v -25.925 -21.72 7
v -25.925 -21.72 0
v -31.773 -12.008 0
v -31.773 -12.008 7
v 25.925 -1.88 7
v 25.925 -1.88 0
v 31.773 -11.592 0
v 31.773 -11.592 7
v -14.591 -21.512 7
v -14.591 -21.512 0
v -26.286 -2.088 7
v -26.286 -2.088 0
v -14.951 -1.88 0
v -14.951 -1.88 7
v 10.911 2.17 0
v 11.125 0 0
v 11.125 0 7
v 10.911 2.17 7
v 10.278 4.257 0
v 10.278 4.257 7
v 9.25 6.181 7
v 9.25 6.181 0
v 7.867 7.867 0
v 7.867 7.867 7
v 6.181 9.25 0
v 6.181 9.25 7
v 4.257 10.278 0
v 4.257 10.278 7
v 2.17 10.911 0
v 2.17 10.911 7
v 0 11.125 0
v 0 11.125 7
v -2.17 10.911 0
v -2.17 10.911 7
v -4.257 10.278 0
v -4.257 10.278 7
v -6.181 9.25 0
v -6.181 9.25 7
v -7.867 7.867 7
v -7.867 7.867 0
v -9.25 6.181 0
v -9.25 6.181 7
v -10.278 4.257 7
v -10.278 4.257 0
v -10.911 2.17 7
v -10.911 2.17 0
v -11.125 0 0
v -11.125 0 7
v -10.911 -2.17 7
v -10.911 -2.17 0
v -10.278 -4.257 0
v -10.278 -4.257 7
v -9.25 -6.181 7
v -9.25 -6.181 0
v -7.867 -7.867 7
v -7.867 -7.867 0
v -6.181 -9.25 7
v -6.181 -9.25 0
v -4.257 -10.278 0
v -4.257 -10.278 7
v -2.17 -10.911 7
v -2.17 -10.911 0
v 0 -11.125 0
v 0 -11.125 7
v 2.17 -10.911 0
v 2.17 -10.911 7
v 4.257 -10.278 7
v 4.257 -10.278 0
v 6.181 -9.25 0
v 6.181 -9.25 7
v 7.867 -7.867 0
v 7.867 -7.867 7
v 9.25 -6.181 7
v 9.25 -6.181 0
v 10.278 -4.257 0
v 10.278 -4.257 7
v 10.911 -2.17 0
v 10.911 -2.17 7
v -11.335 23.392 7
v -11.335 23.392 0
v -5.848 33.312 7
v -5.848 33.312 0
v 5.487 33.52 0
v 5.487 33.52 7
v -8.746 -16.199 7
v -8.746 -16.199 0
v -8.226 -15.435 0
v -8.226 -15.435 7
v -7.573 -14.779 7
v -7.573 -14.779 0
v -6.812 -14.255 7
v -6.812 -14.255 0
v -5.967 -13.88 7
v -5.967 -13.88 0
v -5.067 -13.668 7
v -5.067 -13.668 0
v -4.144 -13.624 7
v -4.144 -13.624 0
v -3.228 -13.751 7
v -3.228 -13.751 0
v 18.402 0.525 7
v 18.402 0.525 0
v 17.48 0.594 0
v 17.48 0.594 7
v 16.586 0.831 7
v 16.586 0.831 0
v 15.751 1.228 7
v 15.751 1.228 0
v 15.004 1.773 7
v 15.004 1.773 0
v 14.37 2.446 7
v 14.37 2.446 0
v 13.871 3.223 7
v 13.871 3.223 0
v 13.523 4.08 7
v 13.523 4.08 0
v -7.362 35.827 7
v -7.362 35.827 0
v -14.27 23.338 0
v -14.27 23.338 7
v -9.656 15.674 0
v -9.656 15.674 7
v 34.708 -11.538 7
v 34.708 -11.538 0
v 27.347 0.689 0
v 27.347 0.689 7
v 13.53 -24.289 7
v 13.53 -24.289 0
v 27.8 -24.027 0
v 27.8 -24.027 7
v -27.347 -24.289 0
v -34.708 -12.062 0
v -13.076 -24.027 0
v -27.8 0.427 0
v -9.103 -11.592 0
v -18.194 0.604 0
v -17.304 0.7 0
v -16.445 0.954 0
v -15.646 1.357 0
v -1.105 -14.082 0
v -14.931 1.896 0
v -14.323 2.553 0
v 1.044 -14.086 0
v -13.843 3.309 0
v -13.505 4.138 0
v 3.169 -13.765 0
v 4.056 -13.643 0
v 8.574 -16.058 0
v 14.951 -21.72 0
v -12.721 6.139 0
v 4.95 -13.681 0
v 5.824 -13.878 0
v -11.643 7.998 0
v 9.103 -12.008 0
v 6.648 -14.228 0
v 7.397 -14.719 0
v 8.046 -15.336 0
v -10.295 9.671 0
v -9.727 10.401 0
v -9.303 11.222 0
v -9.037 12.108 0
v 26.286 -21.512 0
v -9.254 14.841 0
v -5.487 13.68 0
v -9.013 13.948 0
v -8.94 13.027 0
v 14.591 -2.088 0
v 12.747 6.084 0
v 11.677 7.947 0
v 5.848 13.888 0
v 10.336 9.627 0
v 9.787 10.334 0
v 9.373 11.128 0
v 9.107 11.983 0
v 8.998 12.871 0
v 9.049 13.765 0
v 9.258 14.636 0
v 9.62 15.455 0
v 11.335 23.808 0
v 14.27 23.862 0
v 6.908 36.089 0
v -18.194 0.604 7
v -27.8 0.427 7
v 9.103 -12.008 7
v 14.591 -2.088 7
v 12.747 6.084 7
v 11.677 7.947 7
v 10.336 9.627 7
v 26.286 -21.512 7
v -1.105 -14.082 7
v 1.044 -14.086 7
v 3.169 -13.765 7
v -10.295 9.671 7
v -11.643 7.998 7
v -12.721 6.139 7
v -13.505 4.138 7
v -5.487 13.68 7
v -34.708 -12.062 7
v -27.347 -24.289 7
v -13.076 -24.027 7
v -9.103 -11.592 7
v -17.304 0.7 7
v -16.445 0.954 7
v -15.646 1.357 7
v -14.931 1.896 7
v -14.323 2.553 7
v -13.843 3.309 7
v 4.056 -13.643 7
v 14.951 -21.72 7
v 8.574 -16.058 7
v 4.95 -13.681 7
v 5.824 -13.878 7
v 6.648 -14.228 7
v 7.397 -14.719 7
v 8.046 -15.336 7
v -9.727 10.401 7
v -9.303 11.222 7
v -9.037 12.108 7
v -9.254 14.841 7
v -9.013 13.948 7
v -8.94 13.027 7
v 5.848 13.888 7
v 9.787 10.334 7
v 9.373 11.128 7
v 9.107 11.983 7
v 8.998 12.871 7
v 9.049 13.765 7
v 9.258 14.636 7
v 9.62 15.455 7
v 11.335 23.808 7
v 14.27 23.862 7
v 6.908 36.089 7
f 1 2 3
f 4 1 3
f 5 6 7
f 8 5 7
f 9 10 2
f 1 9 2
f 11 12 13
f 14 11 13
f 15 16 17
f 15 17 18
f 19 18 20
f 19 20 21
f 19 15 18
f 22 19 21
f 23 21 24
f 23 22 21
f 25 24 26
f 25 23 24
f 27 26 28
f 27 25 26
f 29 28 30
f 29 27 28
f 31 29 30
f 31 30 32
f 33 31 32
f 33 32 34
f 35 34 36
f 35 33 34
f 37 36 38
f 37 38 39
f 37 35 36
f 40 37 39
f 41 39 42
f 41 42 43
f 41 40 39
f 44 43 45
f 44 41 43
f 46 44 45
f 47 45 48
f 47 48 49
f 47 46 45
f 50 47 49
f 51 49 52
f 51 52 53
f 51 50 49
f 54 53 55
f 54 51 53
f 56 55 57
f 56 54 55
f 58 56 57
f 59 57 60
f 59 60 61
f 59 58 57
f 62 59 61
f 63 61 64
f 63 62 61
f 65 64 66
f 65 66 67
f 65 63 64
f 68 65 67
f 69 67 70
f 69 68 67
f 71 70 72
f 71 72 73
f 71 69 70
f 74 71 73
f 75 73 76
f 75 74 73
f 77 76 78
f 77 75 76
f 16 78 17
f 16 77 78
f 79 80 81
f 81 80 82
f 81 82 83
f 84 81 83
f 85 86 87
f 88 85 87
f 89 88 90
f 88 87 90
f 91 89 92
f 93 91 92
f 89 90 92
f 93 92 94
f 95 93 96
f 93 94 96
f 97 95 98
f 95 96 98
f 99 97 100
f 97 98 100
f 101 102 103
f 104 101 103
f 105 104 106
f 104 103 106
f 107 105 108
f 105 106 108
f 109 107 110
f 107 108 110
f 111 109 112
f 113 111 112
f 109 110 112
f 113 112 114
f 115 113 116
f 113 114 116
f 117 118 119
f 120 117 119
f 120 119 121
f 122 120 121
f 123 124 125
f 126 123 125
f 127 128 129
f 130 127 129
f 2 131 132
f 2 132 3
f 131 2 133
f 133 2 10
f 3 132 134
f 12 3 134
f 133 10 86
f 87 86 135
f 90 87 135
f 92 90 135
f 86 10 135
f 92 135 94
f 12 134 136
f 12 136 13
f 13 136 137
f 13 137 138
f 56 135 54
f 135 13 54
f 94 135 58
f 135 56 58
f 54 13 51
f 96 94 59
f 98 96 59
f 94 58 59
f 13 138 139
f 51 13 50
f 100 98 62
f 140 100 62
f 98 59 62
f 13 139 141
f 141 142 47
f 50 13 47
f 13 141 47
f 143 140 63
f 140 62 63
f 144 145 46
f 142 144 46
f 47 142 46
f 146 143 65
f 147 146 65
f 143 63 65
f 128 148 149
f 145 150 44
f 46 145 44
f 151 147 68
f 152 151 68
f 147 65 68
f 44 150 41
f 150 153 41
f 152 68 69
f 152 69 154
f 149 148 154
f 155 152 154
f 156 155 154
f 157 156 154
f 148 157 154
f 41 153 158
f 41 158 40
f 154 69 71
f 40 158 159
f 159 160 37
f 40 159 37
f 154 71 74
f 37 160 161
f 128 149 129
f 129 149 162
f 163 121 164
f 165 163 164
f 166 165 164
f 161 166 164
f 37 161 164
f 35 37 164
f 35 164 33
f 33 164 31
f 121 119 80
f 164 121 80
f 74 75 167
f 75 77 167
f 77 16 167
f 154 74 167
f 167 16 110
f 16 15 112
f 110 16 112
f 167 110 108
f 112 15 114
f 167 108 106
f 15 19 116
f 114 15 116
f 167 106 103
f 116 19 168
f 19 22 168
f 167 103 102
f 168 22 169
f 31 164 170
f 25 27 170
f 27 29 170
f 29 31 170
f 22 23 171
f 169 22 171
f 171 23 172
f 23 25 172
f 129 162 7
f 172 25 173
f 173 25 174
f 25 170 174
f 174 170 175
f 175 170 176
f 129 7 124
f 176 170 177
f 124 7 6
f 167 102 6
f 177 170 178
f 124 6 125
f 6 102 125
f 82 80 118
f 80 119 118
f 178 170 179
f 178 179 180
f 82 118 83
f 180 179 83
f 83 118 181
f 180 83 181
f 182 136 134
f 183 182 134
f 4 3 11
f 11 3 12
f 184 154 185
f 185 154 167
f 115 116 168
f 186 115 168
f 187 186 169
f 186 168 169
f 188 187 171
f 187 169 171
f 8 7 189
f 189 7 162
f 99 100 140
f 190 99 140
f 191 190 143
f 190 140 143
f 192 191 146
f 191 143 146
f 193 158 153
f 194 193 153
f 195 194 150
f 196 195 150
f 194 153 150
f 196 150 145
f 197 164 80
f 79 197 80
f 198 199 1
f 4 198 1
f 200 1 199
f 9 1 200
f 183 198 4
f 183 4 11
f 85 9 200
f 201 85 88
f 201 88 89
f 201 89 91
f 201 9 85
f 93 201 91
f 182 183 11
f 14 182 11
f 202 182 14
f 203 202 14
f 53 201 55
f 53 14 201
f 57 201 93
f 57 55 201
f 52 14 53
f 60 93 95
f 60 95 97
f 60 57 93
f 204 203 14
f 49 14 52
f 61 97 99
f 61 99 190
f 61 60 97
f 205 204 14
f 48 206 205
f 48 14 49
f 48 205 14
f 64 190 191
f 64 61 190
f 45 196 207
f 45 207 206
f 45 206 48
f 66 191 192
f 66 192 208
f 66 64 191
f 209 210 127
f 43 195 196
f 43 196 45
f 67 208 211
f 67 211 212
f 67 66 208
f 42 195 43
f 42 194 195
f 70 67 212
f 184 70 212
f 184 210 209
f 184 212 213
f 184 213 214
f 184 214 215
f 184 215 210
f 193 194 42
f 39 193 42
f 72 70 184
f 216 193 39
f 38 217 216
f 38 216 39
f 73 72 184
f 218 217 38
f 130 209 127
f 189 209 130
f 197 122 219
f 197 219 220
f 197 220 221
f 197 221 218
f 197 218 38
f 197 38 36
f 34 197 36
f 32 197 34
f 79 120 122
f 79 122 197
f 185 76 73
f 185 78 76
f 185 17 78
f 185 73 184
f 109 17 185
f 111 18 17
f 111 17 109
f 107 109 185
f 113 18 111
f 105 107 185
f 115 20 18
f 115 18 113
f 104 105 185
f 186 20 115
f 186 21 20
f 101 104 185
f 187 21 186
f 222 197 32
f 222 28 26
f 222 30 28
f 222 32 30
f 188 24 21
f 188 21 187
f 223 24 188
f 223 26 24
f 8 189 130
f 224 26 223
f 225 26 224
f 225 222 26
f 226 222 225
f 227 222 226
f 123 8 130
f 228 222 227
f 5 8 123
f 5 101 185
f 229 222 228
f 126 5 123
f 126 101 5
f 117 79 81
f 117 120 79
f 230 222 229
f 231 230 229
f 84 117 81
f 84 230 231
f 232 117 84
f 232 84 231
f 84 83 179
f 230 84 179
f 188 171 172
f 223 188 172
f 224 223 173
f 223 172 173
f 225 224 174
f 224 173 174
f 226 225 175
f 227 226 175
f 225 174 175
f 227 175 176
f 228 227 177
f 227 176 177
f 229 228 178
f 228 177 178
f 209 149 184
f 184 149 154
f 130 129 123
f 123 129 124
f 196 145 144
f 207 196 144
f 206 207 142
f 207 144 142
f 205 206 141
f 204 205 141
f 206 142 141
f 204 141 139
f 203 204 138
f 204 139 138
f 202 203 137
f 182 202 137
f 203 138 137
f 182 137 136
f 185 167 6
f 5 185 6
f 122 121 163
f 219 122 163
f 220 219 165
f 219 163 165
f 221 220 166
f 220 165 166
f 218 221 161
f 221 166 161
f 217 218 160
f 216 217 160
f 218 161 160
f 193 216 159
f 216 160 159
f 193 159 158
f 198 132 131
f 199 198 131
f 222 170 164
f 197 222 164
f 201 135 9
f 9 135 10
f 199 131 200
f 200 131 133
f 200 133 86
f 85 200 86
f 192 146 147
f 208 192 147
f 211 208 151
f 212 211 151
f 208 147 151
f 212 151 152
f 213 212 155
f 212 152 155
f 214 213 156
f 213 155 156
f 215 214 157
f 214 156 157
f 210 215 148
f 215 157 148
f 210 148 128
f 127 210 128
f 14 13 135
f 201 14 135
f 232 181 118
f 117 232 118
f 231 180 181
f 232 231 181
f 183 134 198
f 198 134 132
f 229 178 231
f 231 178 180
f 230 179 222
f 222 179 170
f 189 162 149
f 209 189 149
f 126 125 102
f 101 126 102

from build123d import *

# Parameters (mm, degrees)
F0_R     = 11.125
F1_DEPTH = 7


with BuildPart() as f1:
    # F0 (on Top) → F1 (new body)
    with BuildSketch(Plane.XY):
        with BuildLine():
            Line((-14.270237, 23.338111), (-9.655566, 15.673587))
            ThreePointArc((-9.655566, 15.673587), (-8.967214, 12.565001), (-10.294885, 9.671141))
            ThreePointArc((-10.294885, 9.671141), (-12.217419, 7.088744), (-13.505254, 4.138083))
            ThreePointArc((-13.505254, 4.138083), (-15.276242, 1.610135), (-18.19413, 0.603733))
            Line((-18.19413, 0.603733), (-27.80012, 0.427443))
            Line((-27.80012, 0.427443), (-34.708436, -12.061889))
            Line((-34.708436, -12.061889), (-27.346516, -24.289332))
            Line((-27.346516, -24.289332), (-13.076279, -24.027443))
            Line((-13.076279, -24.027443), (-8.745941, -16.198759))
            ThreePointArc((-8.745941, -16.198759), (-6.398003, -14.048335), (-3.228012, -13.751202))
            ThreePointArc((-3.228012, -13.751202), (-0.030322, -14.124967), (3.168942, -13.764935))
            ThreePointArc((3.168942, -13.764935), (6.243703, -14.034681), (8.574217, -16.058446))
            Line((8.574217, -16.058446), (13.529883, -24.289332))
            Line((13.529883, -24.289332), (27.80012, -24.027443))
            Line((27.80012, -24.027443), (34.708436, -11.538111))
            Line((34.708436, -11.538111), (27.346516, 0.689332))
            Line((27.346516, 0.689332), (18.401507, 0.525172))
            ThreePointArc((18.401507, 0.525172), (15.365217, 1.483334), (13.522896, 4.080061))
            ThreePointArc((13.522896, 4.080061), (12.247742, 7.036224), (10.336312, 9.626852))
            ThreePointArc((10.336312, 9.626852), (9.032538, 12.424546), (9.619913, 15.454712))
            Line((9.619913, 15.454712), (14.270237, 23.861889))
            Line((14.270237, 23.861889), (6.908316, 36.089332))
            Line((6.908316, 36.089332), (-7.361921, 35.827443))
            Line((-7.361921, 35.827443), (-14.270237, 23.338111))
        make_face()
        Polygon((-26.285783, -2.087725), (-14.950914, -1.879706), (-9.103331, -11.591982), (-14.590616, -21.512275), (-25.925485, -21.720294), (-31.773068, -12.008018), align=None, mode=Mode.SUBTRACT)
        Polygon((14.950914, -21.720294), (9.103331, -12.008018), (14.590616, -2.087725), (25.925485, -1.879706), (31.773068, -11.591982), (26.285783, -21.512275), align=None, mode=Mode.SUBTRACT)
        Circle(F0_R, mode=Mode.SUBTRACT)
        Polygon((-5.487285, 13.679706), (-11.334869, 23.391982), (-5.847584, 33.312275), (5.487285, 33.520294), (11.334869, 23.808018), (5.847584, 13.887725), align=None, mode=Mode.SUBTRACT)
    extrude(amount=F1_DEPTH)


solid = f1.part
